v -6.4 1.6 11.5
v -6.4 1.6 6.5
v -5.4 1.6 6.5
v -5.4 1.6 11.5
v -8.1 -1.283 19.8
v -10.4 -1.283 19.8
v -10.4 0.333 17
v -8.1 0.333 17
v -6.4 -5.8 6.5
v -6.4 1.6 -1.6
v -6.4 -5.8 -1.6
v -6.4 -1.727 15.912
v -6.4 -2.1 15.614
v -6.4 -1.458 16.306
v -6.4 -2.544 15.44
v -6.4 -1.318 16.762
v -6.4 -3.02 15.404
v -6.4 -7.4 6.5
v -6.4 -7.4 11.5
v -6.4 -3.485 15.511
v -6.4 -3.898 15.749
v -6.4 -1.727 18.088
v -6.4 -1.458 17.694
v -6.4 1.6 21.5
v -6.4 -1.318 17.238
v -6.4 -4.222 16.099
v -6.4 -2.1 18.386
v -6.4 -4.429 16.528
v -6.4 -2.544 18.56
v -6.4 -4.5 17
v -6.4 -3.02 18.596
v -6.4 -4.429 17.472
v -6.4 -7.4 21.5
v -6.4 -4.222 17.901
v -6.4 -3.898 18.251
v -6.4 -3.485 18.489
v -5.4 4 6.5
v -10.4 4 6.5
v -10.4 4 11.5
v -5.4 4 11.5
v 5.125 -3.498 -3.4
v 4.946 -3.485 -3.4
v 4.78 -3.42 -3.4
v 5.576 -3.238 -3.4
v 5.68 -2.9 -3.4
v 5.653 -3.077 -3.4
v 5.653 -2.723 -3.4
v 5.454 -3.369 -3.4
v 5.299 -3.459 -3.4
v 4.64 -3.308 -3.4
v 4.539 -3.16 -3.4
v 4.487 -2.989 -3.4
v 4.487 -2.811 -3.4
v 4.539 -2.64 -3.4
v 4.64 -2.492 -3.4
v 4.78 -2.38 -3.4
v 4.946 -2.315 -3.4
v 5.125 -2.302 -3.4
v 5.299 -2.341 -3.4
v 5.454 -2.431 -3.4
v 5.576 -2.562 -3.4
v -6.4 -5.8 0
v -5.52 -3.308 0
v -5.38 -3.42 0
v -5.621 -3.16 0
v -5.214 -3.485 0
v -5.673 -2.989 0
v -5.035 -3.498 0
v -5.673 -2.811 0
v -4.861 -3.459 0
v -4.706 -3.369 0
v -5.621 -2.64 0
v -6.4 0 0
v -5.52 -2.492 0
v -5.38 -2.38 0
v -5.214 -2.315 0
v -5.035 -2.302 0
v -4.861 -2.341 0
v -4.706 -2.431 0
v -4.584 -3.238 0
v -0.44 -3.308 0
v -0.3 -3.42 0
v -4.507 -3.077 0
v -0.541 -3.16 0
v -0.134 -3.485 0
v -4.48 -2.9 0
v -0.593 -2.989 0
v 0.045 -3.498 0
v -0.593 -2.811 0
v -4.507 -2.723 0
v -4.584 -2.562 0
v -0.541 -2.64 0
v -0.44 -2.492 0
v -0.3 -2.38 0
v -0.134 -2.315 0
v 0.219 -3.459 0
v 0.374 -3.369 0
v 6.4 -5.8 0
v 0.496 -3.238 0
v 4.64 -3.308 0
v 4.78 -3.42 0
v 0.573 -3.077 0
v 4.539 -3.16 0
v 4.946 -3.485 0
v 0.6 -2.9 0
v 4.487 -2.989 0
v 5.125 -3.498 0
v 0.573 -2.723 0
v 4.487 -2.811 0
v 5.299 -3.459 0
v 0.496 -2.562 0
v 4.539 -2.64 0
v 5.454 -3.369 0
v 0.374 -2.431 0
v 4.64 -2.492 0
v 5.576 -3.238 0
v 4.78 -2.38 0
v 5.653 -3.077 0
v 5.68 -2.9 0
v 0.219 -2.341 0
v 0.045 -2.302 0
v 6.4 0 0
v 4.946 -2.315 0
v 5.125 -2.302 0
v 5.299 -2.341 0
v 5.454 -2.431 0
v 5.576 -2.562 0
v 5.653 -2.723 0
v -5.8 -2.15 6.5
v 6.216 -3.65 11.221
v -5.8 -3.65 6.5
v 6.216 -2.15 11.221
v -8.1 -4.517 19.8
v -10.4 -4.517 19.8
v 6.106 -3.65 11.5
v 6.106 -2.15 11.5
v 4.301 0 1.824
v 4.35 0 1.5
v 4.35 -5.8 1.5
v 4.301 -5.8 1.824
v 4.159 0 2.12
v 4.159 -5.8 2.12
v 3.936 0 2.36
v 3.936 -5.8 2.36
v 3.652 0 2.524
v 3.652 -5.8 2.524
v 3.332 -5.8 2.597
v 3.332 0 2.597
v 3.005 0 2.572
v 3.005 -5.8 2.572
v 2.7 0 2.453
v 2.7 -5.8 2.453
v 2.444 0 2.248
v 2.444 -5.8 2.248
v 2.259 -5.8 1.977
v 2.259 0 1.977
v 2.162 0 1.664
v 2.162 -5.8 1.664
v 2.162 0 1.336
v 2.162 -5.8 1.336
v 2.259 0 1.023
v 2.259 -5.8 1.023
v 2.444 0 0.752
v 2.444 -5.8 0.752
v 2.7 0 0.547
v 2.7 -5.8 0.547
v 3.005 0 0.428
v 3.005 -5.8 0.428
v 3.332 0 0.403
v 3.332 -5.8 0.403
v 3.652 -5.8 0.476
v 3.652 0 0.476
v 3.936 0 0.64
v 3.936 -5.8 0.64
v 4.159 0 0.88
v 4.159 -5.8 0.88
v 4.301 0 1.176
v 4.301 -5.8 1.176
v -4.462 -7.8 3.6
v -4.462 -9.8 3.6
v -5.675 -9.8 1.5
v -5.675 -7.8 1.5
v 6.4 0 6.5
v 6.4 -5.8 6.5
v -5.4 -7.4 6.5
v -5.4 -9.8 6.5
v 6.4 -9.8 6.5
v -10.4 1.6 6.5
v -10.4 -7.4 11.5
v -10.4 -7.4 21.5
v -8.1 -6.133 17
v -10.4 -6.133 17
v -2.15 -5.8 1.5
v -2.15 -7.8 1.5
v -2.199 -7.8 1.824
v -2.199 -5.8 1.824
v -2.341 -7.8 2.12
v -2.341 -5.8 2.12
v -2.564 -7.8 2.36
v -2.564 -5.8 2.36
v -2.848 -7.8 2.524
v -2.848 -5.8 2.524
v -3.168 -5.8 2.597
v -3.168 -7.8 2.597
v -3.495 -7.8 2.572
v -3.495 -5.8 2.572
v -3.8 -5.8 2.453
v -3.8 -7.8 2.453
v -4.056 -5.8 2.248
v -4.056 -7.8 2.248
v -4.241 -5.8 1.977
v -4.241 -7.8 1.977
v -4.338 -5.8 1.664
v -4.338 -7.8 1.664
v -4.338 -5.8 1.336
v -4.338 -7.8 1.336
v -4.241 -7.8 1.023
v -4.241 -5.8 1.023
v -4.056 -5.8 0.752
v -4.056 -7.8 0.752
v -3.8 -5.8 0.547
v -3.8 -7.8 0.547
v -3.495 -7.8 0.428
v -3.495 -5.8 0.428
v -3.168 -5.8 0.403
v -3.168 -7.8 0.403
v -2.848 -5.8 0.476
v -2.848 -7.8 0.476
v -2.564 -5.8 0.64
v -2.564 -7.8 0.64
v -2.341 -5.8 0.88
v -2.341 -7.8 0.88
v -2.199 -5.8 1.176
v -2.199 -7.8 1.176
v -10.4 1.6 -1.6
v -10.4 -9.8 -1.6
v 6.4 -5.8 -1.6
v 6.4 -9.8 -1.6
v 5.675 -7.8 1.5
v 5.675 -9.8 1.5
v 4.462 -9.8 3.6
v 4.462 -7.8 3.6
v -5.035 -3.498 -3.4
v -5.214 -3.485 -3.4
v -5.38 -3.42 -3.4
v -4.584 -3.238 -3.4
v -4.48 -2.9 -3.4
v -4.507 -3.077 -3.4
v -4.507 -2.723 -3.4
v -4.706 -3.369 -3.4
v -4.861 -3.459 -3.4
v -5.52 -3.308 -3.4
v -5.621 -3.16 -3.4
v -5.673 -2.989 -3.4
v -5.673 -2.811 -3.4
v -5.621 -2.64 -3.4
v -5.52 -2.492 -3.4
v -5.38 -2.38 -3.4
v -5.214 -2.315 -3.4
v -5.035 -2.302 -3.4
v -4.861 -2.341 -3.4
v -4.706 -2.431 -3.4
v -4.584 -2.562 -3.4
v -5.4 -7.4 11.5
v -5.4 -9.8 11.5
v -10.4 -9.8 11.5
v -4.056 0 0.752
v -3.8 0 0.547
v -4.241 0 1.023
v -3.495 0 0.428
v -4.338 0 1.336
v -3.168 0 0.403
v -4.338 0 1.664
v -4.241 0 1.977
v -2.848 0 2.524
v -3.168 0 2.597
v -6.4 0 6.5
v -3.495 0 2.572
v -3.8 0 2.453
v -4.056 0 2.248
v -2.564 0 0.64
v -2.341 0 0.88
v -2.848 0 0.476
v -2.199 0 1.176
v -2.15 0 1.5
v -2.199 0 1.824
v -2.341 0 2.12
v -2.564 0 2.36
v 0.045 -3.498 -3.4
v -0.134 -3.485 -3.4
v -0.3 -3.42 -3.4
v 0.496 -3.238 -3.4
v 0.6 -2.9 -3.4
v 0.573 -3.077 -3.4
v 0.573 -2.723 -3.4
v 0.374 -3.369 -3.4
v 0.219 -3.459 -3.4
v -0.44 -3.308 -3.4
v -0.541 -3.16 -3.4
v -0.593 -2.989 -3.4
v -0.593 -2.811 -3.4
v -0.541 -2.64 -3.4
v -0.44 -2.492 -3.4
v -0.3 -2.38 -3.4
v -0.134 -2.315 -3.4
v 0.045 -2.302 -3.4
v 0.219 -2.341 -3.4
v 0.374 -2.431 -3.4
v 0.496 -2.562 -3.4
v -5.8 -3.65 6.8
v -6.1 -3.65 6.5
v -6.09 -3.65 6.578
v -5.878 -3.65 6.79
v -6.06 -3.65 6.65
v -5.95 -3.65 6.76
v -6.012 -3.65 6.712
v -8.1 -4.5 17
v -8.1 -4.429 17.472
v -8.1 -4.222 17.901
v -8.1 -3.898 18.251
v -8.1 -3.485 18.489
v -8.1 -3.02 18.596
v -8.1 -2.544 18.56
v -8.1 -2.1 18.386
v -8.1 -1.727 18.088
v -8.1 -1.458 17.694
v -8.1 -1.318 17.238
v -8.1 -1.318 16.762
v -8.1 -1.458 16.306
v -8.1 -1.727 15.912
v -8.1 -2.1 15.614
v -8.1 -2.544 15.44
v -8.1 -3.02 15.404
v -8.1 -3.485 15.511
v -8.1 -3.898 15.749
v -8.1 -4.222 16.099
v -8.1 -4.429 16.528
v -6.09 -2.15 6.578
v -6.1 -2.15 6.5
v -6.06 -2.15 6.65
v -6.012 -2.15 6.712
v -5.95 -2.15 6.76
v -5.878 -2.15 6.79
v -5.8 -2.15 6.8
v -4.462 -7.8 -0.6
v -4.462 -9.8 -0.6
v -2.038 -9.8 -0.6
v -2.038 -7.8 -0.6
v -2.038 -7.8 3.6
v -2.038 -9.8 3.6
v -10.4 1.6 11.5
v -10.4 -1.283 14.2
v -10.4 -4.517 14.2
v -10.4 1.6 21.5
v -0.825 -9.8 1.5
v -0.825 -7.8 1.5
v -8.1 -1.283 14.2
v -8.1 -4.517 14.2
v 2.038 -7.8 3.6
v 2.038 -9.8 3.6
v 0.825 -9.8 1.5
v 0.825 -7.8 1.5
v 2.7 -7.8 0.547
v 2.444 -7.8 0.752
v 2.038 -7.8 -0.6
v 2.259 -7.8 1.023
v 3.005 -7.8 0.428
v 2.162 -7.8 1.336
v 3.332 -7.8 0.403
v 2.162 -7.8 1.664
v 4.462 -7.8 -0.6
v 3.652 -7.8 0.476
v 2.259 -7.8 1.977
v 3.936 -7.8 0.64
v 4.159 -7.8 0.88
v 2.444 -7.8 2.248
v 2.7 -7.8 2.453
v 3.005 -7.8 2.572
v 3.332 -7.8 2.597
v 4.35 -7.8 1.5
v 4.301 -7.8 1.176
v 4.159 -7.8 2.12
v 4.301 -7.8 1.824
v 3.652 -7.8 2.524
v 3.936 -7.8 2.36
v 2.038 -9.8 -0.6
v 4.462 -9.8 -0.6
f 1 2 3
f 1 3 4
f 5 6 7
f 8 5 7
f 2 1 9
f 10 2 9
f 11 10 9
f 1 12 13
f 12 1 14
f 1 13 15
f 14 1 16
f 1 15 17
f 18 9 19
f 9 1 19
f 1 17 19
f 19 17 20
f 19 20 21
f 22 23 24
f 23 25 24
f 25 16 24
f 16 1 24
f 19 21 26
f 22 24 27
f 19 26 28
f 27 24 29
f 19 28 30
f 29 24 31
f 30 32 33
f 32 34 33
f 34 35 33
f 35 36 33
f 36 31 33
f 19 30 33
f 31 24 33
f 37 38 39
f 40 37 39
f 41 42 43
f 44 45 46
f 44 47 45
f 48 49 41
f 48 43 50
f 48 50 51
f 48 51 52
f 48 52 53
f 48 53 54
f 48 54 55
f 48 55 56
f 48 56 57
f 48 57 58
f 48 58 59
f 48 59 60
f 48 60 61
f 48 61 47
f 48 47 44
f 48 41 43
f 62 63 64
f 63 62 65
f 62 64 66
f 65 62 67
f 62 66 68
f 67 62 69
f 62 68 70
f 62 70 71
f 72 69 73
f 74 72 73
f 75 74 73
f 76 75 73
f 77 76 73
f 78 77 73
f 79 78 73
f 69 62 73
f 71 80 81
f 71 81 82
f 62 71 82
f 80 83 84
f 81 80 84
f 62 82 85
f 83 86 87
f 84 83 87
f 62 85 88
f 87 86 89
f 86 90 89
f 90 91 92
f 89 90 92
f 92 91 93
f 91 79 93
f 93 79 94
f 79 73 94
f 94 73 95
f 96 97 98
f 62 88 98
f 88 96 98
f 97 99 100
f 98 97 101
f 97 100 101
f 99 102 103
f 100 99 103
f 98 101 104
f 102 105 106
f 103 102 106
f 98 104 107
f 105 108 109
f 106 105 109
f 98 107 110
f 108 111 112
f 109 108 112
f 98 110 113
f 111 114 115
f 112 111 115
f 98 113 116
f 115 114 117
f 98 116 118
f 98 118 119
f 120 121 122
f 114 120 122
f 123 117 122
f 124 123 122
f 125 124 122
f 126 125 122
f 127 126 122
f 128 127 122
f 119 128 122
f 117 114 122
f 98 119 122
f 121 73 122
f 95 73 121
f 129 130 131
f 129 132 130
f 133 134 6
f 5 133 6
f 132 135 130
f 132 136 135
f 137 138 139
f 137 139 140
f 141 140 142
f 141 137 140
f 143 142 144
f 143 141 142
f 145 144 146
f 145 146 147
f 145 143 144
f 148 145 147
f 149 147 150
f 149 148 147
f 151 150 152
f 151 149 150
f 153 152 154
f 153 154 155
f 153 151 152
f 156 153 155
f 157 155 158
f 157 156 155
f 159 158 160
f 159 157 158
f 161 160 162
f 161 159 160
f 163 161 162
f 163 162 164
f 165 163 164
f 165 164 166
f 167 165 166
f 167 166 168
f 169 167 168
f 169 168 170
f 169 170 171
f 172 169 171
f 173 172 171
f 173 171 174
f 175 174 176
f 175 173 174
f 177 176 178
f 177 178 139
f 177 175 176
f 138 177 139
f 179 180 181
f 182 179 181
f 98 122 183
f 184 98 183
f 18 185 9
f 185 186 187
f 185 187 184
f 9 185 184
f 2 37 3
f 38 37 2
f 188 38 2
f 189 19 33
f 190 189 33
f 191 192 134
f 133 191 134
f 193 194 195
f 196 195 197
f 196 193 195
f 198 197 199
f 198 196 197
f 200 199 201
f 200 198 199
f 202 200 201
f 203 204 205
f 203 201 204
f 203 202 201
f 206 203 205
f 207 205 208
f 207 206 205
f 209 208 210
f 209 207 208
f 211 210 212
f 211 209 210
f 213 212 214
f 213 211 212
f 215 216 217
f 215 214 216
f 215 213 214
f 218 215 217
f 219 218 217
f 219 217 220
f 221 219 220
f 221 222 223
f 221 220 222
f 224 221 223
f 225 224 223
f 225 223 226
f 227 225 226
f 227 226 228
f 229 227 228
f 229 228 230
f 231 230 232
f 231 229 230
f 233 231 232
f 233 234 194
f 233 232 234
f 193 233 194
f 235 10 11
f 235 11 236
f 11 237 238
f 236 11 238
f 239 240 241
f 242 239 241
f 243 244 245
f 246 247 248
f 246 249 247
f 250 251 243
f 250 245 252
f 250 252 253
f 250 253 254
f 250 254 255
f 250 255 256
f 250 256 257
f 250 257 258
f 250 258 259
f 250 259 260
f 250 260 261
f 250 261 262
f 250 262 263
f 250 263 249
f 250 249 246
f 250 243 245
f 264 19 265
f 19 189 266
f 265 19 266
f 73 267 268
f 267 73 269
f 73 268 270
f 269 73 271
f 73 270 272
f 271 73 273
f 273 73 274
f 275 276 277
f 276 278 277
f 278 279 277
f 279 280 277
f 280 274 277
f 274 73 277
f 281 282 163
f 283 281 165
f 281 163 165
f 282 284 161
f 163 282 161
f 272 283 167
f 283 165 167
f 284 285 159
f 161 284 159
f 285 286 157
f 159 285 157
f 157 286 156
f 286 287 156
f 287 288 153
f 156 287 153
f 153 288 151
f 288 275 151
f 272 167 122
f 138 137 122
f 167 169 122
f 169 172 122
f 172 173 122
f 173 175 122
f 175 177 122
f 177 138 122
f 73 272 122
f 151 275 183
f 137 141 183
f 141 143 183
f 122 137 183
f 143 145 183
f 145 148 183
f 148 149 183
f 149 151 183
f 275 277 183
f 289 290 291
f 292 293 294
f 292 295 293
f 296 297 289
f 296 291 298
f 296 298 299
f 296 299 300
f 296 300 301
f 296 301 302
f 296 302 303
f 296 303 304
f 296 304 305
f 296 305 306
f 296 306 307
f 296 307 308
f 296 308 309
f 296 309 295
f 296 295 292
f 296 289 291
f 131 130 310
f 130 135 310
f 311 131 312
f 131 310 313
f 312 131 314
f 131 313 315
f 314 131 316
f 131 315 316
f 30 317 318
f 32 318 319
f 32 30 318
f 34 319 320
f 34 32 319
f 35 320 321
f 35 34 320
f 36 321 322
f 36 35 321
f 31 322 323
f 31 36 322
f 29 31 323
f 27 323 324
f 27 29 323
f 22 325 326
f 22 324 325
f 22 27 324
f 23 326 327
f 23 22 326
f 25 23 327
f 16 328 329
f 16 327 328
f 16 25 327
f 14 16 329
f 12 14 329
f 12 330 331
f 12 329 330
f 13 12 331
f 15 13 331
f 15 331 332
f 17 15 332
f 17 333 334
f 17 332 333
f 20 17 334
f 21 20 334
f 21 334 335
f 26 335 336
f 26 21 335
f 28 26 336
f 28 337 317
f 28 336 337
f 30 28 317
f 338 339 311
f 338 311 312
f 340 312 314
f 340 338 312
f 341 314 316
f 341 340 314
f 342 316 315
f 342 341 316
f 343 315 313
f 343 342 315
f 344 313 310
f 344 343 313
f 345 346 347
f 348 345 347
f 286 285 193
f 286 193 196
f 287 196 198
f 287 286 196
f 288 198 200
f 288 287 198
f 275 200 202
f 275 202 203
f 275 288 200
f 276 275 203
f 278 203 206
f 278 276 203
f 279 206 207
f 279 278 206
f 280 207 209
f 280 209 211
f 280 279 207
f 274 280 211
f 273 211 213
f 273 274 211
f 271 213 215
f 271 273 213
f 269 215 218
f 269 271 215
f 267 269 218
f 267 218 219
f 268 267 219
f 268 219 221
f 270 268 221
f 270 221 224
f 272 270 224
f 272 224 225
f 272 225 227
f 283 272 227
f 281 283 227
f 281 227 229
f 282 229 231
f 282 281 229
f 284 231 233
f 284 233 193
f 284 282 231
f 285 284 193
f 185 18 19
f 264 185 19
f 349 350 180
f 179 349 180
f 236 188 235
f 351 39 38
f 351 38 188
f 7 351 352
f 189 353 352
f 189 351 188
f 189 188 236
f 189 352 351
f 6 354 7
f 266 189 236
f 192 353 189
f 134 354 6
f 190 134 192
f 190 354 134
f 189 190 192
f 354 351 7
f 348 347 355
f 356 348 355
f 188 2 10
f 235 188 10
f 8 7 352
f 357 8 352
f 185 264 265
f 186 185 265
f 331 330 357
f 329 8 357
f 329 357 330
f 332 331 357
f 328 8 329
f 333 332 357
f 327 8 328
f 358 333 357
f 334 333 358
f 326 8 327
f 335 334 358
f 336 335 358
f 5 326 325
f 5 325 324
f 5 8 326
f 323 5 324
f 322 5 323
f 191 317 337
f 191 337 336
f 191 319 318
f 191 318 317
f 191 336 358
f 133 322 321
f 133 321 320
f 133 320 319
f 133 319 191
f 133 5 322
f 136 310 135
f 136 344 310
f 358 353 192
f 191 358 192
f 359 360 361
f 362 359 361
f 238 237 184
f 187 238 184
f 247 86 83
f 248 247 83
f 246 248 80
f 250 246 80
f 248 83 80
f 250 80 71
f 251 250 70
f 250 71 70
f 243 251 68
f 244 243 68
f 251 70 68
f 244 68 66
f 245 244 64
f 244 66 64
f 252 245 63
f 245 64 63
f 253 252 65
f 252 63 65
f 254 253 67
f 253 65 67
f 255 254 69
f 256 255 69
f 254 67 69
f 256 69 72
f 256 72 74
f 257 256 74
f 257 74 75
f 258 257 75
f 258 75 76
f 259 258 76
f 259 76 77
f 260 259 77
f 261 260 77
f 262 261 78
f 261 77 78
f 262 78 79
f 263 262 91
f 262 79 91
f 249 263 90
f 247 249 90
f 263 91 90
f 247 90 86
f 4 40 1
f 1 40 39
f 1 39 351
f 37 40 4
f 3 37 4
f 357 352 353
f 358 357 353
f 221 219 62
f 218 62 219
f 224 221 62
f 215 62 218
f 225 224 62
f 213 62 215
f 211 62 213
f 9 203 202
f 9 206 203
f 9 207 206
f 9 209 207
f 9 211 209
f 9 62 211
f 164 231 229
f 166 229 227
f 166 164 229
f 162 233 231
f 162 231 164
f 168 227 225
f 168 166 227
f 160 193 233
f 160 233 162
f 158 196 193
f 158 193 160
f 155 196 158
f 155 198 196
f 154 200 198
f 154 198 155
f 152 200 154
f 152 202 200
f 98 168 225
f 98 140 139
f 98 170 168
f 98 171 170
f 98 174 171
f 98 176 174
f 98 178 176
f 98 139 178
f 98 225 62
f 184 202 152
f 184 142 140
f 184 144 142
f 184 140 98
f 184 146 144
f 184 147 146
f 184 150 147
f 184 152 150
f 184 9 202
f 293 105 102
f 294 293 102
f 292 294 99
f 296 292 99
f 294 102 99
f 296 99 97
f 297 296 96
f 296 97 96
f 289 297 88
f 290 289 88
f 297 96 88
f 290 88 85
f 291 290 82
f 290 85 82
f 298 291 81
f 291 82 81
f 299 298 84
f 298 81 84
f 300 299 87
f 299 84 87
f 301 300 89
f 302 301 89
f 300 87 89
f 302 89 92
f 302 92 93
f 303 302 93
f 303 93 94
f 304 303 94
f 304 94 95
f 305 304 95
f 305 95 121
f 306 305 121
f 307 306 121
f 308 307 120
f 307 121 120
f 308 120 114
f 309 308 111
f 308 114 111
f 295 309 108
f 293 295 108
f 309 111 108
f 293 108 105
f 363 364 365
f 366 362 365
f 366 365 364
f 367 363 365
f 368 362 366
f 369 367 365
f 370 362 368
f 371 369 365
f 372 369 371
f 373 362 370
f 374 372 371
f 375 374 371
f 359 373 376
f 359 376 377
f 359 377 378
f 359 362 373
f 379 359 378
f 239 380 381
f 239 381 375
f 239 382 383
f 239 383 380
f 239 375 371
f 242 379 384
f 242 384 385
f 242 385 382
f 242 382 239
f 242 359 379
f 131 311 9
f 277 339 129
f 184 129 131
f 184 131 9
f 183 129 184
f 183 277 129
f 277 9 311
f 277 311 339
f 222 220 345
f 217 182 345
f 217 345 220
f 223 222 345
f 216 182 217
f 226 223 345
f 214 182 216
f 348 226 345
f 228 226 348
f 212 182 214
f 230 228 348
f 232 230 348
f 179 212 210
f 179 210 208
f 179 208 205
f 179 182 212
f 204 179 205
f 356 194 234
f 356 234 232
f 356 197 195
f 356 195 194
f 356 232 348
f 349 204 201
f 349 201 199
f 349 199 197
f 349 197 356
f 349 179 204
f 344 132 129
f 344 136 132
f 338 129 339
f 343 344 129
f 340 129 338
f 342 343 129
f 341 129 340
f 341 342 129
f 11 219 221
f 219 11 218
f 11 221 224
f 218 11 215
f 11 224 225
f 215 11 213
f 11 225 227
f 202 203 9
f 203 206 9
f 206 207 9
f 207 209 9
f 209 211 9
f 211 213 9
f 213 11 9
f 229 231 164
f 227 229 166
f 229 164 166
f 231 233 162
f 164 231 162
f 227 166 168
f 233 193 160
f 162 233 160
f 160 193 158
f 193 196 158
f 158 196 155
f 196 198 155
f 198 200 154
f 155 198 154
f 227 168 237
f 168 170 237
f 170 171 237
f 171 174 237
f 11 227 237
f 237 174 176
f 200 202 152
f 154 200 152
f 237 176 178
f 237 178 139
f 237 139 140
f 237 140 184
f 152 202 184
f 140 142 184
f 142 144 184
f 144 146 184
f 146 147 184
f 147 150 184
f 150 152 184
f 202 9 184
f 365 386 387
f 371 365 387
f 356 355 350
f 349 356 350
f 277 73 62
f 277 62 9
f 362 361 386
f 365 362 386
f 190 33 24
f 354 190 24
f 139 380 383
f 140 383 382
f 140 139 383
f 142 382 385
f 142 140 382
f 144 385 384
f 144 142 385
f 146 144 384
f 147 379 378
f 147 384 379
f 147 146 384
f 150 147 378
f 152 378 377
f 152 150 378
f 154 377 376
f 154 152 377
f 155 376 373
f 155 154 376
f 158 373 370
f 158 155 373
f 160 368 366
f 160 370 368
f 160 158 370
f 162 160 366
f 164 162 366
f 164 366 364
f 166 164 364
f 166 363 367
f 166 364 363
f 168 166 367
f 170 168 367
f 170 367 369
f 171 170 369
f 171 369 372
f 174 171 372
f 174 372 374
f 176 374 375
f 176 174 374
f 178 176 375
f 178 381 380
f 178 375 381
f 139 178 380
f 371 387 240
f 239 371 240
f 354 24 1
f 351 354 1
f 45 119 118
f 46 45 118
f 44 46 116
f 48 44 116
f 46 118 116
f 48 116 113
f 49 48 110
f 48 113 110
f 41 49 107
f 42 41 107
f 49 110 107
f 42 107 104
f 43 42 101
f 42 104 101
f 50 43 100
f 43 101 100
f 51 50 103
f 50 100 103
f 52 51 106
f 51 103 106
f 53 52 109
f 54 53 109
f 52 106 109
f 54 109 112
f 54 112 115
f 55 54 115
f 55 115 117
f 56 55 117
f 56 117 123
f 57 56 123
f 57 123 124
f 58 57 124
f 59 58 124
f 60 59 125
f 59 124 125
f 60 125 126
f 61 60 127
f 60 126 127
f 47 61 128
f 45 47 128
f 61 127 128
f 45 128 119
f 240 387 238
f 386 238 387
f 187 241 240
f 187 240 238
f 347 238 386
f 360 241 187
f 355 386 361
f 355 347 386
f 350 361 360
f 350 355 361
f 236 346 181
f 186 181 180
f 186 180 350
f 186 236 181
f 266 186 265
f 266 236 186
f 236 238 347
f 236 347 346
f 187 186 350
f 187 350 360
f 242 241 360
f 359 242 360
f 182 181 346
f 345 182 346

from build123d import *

# Parameters (mm, degrees)
F0_W      = 12.8
F0_H      = 6.5
F0_R      = 1.1
F1_DEPTH  = 5.8
F2_R      = 0.6
F3_DEPTH  = 3.4
F6_DEPTH  = 0.75
F7_W      = 12.8
F7_H      = 8.1
F7_R      = 1.1
F8_DEPTH  = 4
F10_DEPTH = 2
F11_R     = 1.6
F12_DEPTH = 4
F14_DEPTH = 2.3
F15_W     = 2.4
F15_H     = 5
F16_DEPTH = 5


with BuildPart() as f1:
    # F0 (on Front) → F1 (new body)
    with BuildSketch(Plane.XZ):
        with Locations((0, 3.25)):
            Rectangle(F0_W, F0_H)
        with Locations((-3.25, 1.5)):
            Circle(F0_R, mode=Mode.SUBTRACT)
        with Locations((3.25, 1.5)):
            Circle(F0_R, mode=Mode.SUBTRACT)
    extrude(amount=F1_DEPTH)

    # F2 (on face) → F3 (join)
    with BuildSketch(Plane(origin=(0, 0, 0), x_dir=(1, 0, 0), z_dir=(0, 0, -1))):
        with Locations((-5.08, 2.9)):
            Circle(F2_R)
        with Locations((0, 2.9)):
            Circle(F2_R)
        with Locations((5.08, 2.9)):
            Circle(F2_R)
    extrude(amount=F3_DEPTH)

    # F5 (on mid) → F6 (join, symmetric)
    with BuildSketch(Plane(origin=(0, -2.9, 0), x_dir=(-1, 0, 0), z_dir=(0, 1, 0))):
        with BuildLine():
            Line((-6.2160371498, 11.2209559164), (5.8, 6.5))
            Line((5.8, 6.5), (6.1, 6.5))
            ThreePointArc((6.1, 6.5), (6.0121320344, 6.7121320344), (5.8, 6.8))
            Line((5.8, 6.8), (-6.1058808998, 11.5))
            Line((-6.1058808998, 11.5), (-6.2160371498, 11.2209559164))
        make_face()
    extrude(amount=F6_DEPTH, both=True)


with BuildPart() as f8:
    # F7 (on face) → F8 (new body)
    with BuildSketch(Plane.XZ.offset(5.8)):
        with Locations((0, 2.45)):
            Rectangle(F7_W, F7_H)
        with Locations((-3.25, 1.5)):
            Circle(F7_R, mode=Mode.SUBTRACT)
        with Locations((3.25, 1.5)):
            Circle(F7_R, mode=Mode.SUBTRACT)
    extrude(amount=F8_DEPTH)

    # F9 (on face) → F10 (cut)
    with BuildSketch(Plane.XZ.offset(9.8)):
        Polygon((-4.4624355653, -0.6), (-2.0375644347, -0.6), (-0.8251288694, 1.5), (-2.0375644347, 3.6), (-4.4624355653, 3.6), (-5.6748711306, 1.5), align=None)
        Polygon((2.0375644347, 3.6), (0.8251288694, 1.5), (2.0375644347, -0.6), (4.4624355653, -0.6), (5.6748711306, 1.5), (4.4624355653, 3.6), align=None)
    extrude(amount=-F10_DEPTH, mode=Mode.SUBTRACT)



with BuildPart() as f12:
    # F11 (on face) → F12 (new body)
    with BuildSketch(Plane(origin=(-6.4, 0, 0), x_dir=(0, -1, 0), z_dir=(-1, 0, 0))):
        Polygon((7.4, 6.5), (7.4, 21.5), (-1.6, 21.5), (-1.6, -1.6), (9.8, -1.6), (9.8, 6.5), align=None)
        with Locations((2.9, 17)):
            Circle(F11_R, mode=Mode.SUBTRACT)
    extrude(amount=F12_DEPTH)

    # F13 (on face) → F14 (cut)
    with BuildSketch(Plane(origin=(-10.4, 0, 0), x_dir=(0, -1, 0), z_dir=(-1, 0, 0))):
        Polygon((1.2834192463, 14.2), (4.5165807537, 14.2), (6.1331615075, 17), (4.5165807537, 19.8), (1.2834192463, 19.8), (-0.3331615075, 17), align=None)
    extrude(amount=-F14_DEPTH, mode=Mode.SUBTRACT)


with BuildPart() as f8_1:
    add(f8.part)

    add(f12.part)  # F16 merges F12
    # F15 (on face) → F16 (join)
    with BuildSketch(Plane(origin=(-10.4, 0, 0), x_dir=(0, -1, 0), z_dir=(-1, 0, 0))):
        with Locations((8.6, 9)):
            Rectangle(F15_W, F15_H)
        with Locations((-2.8, 9)):
            Rectangle(F15_W, F15_H)
    extrude(amount=-F16_DEPTH)


solid = Compound([f1.part, f8_1.part])
